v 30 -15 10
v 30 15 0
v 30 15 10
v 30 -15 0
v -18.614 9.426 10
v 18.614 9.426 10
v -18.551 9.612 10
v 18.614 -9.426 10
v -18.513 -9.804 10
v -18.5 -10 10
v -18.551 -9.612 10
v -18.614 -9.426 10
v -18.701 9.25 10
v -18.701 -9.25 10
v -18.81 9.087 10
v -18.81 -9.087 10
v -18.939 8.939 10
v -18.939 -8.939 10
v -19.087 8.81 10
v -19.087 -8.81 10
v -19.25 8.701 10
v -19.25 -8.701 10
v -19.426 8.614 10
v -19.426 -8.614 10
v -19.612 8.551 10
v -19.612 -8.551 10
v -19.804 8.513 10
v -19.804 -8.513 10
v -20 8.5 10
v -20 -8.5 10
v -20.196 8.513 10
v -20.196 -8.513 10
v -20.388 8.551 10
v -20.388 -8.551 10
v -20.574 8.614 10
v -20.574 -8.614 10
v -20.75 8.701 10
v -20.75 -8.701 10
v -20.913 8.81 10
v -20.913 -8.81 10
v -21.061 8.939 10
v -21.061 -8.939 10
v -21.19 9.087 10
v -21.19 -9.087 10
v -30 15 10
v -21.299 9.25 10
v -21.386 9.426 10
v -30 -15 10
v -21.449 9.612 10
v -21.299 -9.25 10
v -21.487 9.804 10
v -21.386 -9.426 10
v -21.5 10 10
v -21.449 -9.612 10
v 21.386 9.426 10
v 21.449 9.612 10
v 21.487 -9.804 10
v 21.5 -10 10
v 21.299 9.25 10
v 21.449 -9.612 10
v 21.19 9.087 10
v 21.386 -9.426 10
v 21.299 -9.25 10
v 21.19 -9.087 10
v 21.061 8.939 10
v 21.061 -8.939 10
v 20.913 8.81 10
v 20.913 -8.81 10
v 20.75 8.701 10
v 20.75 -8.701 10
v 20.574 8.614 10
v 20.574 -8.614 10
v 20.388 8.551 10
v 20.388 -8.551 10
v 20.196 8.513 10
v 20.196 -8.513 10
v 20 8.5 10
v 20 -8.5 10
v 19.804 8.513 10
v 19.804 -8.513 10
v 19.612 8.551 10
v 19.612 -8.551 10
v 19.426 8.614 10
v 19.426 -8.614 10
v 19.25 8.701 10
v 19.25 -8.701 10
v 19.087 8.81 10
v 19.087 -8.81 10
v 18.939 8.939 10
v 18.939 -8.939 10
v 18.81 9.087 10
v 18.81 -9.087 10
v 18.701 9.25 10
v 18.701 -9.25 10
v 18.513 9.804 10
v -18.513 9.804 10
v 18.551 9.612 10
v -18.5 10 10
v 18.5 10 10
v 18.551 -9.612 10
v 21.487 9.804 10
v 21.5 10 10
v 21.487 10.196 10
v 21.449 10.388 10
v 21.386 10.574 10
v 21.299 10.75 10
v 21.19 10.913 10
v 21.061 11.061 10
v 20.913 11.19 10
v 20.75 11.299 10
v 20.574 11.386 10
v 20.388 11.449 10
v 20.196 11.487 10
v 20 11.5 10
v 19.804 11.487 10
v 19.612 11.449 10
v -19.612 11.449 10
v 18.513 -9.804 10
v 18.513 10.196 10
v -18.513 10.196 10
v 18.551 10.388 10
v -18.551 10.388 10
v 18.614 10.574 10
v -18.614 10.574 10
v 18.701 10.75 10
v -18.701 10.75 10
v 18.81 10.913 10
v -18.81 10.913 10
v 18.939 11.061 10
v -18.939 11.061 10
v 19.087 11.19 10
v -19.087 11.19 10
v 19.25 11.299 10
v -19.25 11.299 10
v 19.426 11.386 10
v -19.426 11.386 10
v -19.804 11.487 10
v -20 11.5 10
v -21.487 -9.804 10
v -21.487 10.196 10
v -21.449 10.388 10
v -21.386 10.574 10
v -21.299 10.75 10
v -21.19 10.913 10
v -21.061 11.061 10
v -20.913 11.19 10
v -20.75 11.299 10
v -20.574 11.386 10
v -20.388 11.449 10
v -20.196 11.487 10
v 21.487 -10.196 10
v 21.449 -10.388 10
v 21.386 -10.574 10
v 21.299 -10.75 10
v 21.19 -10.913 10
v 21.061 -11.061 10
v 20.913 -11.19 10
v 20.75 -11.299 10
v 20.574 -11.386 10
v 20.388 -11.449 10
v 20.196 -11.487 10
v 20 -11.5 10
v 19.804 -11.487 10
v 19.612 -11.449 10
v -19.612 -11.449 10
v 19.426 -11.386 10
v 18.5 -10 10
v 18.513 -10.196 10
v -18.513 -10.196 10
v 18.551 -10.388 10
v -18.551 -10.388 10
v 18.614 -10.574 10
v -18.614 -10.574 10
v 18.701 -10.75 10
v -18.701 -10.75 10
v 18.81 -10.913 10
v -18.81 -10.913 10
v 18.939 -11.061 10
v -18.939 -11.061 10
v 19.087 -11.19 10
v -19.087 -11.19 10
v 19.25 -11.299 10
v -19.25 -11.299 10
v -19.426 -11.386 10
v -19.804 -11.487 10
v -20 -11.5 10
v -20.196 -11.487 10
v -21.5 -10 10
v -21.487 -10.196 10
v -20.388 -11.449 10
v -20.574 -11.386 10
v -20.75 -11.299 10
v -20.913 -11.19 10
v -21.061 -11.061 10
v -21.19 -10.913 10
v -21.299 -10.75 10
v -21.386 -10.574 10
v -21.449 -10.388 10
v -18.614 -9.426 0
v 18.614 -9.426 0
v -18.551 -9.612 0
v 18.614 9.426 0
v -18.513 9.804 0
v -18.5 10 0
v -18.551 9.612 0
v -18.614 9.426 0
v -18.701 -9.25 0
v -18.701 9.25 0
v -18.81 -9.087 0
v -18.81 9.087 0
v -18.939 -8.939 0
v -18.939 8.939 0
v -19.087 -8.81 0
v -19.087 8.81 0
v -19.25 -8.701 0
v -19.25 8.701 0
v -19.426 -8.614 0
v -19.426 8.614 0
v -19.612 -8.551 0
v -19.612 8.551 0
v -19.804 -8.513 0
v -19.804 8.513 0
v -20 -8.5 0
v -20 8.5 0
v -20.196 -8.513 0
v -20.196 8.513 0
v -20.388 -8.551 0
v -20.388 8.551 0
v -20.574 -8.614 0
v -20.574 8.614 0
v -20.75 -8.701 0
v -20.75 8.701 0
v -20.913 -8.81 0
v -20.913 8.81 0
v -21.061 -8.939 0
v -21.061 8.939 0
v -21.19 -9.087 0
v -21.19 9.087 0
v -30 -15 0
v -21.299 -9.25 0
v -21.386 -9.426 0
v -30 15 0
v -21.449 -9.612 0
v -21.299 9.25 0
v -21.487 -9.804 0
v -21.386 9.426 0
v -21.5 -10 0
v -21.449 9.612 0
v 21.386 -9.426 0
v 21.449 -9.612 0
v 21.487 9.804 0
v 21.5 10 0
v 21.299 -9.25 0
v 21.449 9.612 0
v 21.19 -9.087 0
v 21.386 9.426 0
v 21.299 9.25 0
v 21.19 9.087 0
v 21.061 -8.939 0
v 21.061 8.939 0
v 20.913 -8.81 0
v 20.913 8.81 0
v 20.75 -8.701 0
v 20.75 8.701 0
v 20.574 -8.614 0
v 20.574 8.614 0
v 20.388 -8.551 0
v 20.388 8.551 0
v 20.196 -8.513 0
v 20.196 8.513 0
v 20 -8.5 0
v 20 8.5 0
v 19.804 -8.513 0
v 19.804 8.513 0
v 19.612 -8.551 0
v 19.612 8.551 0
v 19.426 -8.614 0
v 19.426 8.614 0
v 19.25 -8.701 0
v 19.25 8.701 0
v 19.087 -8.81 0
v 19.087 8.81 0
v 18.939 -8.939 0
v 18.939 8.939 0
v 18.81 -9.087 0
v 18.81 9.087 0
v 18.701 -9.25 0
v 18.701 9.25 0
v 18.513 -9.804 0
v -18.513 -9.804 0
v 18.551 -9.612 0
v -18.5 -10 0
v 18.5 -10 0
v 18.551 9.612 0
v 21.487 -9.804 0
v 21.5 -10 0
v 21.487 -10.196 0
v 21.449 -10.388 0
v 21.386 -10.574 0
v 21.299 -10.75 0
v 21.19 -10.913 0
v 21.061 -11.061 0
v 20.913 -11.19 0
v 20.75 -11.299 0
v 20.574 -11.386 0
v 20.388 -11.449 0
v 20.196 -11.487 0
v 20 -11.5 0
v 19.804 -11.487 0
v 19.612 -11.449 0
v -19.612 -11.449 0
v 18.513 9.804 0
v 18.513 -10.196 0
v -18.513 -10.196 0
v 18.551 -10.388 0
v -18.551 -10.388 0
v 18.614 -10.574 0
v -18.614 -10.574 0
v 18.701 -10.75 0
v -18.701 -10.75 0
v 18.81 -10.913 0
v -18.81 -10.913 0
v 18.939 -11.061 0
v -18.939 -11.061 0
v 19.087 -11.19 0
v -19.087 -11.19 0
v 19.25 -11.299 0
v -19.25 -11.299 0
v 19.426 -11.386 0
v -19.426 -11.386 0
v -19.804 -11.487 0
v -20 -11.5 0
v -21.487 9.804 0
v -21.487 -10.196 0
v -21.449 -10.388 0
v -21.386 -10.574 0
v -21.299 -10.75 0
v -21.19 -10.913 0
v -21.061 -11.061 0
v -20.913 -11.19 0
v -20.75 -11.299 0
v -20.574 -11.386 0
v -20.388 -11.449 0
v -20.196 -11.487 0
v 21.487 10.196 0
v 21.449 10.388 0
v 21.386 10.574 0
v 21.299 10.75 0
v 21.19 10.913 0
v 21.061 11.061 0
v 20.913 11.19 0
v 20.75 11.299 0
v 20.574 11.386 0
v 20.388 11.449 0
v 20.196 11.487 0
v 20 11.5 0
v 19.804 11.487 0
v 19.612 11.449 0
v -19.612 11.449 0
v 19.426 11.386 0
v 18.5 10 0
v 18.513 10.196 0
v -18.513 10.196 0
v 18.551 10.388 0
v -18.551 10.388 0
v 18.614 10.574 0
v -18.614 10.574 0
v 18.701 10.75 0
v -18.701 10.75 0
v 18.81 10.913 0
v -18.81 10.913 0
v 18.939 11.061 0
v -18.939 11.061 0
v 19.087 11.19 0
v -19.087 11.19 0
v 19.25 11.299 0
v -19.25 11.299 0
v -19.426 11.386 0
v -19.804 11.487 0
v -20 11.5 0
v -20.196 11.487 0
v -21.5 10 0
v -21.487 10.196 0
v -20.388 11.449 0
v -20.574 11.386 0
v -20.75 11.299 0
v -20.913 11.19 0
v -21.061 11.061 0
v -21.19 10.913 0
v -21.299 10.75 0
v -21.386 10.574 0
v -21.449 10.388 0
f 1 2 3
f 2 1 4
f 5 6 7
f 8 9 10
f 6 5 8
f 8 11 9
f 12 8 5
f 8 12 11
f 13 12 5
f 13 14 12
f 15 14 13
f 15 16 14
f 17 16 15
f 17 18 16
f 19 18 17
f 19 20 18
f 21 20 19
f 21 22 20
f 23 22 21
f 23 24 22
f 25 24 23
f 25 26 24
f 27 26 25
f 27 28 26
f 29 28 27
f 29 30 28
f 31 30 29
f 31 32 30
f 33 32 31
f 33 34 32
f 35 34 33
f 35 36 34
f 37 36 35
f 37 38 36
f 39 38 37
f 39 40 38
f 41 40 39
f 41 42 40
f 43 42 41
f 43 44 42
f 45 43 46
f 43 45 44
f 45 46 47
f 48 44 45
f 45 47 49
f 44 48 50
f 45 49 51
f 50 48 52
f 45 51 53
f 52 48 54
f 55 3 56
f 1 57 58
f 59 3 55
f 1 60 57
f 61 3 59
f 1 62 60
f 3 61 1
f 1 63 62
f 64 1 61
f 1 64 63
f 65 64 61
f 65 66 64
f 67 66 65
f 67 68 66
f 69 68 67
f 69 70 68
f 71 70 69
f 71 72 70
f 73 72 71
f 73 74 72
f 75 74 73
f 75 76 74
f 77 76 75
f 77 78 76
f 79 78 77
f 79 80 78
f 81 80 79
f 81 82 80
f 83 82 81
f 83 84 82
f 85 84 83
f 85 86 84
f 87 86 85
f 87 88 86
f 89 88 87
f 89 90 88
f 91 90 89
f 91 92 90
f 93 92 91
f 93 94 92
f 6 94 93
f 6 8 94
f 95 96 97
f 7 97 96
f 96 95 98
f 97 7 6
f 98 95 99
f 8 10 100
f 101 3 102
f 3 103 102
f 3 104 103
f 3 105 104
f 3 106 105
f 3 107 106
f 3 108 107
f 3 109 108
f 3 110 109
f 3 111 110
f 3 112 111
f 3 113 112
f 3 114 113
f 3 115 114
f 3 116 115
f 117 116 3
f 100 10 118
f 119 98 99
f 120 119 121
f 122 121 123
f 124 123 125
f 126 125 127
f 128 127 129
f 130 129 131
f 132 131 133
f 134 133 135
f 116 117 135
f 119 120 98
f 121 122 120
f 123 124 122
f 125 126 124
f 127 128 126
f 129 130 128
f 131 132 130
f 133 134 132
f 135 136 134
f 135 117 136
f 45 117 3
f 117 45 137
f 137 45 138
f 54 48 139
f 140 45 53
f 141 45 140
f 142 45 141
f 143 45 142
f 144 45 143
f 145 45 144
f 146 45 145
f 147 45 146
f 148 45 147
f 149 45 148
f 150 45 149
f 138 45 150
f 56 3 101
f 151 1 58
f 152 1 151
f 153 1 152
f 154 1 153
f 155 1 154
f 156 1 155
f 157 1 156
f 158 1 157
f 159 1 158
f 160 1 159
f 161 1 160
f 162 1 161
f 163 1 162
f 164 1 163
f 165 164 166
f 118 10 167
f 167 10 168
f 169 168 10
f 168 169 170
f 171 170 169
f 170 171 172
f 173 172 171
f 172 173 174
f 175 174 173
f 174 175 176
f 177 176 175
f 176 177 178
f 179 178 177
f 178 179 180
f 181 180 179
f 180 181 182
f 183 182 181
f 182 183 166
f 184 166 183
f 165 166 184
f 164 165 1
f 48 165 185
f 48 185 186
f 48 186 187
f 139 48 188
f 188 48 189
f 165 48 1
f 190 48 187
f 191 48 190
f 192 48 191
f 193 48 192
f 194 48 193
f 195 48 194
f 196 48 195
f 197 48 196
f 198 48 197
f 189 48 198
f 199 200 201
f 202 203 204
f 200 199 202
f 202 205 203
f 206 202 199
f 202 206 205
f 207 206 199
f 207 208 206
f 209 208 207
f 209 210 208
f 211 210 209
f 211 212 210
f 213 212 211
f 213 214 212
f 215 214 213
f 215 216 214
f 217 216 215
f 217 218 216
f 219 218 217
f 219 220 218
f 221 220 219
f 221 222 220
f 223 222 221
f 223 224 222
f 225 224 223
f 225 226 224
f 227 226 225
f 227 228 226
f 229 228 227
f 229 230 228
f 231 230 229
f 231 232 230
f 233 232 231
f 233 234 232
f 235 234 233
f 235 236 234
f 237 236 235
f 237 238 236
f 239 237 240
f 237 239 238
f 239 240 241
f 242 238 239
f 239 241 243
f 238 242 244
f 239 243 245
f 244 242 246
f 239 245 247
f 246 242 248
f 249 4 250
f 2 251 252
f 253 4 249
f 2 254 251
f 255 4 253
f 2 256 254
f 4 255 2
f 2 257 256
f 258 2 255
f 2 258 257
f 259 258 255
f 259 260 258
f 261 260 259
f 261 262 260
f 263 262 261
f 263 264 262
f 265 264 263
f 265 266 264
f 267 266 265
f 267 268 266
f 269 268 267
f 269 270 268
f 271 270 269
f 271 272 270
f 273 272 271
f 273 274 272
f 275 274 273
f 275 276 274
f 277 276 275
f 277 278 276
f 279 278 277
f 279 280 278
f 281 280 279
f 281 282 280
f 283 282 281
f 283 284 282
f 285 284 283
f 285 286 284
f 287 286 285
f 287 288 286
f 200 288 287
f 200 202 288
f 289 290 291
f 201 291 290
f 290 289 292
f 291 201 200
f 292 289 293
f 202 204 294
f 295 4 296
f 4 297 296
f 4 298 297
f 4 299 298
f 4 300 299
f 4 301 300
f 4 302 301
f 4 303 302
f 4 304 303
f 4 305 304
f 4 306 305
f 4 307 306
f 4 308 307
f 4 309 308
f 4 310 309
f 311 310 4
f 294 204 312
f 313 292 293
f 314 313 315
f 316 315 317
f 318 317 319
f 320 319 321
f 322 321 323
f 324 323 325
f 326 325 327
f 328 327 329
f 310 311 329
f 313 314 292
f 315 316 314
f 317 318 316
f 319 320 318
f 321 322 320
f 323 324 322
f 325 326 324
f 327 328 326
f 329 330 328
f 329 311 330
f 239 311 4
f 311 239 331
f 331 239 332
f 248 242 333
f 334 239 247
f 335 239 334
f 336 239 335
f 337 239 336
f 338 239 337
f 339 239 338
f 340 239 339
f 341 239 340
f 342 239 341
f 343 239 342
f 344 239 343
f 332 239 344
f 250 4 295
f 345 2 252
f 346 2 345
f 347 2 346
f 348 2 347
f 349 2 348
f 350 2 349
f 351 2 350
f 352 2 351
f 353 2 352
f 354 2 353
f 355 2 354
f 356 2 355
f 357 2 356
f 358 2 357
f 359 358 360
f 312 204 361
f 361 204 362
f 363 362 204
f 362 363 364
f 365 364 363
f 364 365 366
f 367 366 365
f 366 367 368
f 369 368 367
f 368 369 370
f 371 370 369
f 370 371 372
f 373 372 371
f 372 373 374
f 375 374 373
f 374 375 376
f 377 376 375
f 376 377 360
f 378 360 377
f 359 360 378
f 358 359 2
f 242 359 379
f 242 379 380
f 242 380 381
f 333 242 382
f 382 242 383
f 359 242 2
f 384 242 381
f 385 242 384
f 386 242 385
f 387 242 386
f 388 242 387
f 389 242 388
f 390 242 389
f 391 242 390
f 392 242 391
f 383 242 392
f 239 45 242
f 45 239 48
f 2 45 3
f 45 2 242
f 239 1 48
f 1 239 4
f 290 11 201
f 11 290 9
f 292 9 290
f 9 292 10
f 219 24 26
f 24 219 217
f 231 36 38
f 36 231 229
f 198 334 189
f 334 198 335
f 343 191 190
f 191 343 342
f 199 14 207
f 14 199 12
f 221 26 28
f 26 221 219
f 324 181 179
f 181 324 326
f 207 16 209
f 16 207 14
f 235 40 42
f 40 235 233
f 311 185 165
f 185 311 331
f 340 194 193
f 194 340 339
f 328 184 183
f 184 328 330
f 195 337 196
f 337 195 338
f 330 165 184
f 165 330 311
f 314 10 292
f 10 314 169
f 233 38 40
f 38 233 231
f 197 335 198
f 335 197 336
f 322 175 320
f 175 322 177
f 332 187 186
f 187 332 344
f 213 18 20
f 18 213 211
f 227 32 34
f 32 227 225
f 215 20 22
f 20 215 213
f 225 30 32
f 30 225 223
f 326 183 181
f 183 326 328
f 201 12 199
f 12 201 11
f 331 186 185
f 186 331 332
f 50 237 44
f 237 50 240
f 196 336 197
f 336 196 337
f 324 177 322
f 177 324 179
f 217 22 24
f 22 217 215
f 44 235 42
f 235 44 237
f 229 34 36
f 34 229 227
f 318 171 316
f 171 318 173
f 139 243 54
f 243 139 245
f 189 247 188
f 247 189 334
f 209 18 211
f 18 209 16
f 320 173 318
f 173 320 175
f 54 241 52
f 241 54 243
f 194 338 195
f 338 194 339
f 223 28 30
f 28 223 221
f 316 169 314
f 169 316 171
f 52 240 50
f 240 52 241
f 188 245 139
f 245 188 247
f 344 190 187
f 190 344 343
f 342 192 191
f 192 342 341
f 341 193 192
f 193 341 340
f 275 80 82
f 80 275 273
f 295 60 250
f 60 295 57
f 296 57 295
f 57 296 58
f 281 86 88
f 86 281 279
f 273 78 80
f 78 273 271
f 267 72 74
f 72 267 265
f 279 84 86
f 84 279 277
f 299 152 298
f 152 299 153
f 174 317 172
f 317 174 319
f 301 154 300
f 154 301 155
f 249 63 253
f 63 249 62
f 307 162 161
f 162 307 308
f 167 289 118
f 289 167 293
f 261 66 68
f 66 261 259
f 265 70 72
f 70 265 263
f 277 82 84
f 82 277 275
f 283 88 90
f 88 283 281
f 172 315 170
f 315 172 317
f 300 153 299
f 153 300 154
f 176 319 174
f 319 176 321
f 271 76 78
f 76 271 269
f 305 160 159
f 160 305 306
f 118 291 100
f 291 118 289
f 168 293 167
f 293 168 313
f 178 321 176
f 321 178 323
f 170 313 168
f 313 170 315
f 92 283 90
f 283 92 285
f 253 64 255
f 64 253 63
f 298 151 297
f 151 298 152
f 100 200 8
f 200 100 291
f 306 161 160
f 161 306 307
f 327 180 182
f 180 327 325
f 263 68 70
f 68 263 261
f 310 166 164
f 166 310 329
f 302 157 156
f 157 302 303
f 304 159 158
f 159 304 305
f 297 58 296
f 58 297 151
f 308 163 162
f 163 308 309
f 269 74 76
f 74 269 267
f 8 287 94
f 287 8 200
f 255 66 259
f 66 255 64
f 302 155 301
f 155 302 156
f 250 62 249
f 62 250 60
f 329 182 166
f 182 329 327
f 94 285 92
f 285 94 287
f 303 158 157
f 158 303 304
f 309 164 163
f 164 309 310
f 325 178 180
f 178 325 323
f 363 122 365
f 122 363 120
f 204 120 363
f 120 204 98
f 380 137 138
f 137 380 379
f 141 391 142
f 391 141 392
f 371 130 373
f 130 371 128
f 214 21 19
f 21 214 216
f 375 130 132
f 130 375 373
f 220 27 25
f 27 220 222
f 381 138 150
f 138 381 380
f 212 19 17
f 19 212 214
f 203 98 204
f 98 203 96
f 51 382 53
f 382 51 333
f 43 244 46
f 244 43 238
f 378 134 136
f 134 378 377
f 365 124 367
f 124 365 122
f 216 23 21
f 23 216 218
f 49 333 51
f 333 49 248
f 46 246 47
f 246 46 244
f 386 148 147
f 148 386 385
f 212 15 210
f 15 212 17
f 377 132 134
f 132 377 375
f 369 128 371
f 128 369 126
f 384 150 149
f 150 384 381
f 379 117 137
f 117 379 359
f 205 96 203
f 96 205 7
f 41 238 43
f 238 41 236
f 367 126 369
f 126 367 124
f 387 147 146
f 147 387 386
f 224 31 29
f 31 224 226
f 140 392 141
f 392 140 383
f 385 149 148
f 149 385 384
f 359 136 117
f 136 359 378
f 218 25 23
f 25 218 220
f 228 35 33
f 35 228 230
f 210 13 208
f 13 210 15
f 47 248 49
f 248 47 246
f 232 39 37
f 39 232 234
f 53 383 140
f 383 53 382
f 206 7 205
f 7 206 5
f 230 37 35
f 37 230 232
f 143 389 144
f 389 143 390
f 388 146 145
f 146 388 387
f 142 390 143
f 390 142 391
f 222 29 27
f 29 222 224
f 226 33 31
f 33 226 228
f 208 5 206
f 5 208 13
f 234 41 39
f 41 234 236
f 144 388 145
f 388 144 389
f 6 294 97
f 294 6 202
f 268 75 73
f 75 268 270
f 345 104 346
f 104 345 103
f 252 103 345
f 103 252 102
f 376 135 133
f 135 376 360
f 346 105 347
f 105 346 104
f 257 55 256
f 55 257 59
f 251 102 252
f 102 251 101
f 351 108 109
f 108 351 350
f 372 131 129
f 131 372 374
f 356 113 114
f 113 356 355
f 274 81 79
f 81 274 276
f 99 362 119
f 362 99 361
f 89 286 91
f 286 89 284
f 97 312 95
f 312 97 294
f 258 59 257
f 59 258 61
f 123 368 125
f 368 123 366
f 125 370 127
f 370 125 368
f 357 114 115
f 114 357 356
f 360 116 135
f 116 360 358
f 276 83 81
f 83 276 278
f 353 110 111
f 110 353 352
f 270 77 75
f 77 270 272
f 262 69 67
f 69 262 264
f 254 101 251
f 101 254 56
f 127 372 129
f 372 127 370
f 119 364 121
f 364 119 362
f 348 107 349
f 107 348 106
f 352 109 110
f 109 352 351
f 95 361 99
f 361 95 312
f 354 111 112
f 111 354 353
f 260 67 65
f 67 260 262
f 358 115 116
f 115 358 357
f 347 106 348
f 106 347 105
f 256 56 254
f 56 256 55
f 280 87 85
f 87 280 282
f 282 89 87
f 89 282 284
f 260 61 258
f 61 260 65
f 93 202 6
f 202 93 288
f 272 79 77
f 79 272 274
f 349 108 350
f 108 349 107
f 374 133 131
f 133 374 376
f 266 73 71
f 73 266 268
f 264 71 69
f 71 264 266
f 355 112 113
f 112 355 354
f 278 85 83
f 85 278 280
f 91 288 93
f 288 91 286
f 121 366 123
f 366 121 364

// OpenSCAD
// Generated by printspec 0.1.0
// Review generated CAD before manufacturing.

length = 60;
width = 30;
height = 10;

difference() {
  translate([-length/2, -width/2, 0]) cube([length, width, height]);
  translate([-20, -10, -0.1]) cylinder(h = height + 0.2, d = 3, $fn = 48);
  translate([20, -10, -0.1]) cylinder(h = height + 0.2, d = 3, $fn = 48);
  translate([-20, 10, -0.1]) cylinder(h = height + 0.2, d = 3, $fn = 48);
  translate([20, 10, -0.1]) cylinder(h = height + 0.2, d = 3, $fn = 48);
}
